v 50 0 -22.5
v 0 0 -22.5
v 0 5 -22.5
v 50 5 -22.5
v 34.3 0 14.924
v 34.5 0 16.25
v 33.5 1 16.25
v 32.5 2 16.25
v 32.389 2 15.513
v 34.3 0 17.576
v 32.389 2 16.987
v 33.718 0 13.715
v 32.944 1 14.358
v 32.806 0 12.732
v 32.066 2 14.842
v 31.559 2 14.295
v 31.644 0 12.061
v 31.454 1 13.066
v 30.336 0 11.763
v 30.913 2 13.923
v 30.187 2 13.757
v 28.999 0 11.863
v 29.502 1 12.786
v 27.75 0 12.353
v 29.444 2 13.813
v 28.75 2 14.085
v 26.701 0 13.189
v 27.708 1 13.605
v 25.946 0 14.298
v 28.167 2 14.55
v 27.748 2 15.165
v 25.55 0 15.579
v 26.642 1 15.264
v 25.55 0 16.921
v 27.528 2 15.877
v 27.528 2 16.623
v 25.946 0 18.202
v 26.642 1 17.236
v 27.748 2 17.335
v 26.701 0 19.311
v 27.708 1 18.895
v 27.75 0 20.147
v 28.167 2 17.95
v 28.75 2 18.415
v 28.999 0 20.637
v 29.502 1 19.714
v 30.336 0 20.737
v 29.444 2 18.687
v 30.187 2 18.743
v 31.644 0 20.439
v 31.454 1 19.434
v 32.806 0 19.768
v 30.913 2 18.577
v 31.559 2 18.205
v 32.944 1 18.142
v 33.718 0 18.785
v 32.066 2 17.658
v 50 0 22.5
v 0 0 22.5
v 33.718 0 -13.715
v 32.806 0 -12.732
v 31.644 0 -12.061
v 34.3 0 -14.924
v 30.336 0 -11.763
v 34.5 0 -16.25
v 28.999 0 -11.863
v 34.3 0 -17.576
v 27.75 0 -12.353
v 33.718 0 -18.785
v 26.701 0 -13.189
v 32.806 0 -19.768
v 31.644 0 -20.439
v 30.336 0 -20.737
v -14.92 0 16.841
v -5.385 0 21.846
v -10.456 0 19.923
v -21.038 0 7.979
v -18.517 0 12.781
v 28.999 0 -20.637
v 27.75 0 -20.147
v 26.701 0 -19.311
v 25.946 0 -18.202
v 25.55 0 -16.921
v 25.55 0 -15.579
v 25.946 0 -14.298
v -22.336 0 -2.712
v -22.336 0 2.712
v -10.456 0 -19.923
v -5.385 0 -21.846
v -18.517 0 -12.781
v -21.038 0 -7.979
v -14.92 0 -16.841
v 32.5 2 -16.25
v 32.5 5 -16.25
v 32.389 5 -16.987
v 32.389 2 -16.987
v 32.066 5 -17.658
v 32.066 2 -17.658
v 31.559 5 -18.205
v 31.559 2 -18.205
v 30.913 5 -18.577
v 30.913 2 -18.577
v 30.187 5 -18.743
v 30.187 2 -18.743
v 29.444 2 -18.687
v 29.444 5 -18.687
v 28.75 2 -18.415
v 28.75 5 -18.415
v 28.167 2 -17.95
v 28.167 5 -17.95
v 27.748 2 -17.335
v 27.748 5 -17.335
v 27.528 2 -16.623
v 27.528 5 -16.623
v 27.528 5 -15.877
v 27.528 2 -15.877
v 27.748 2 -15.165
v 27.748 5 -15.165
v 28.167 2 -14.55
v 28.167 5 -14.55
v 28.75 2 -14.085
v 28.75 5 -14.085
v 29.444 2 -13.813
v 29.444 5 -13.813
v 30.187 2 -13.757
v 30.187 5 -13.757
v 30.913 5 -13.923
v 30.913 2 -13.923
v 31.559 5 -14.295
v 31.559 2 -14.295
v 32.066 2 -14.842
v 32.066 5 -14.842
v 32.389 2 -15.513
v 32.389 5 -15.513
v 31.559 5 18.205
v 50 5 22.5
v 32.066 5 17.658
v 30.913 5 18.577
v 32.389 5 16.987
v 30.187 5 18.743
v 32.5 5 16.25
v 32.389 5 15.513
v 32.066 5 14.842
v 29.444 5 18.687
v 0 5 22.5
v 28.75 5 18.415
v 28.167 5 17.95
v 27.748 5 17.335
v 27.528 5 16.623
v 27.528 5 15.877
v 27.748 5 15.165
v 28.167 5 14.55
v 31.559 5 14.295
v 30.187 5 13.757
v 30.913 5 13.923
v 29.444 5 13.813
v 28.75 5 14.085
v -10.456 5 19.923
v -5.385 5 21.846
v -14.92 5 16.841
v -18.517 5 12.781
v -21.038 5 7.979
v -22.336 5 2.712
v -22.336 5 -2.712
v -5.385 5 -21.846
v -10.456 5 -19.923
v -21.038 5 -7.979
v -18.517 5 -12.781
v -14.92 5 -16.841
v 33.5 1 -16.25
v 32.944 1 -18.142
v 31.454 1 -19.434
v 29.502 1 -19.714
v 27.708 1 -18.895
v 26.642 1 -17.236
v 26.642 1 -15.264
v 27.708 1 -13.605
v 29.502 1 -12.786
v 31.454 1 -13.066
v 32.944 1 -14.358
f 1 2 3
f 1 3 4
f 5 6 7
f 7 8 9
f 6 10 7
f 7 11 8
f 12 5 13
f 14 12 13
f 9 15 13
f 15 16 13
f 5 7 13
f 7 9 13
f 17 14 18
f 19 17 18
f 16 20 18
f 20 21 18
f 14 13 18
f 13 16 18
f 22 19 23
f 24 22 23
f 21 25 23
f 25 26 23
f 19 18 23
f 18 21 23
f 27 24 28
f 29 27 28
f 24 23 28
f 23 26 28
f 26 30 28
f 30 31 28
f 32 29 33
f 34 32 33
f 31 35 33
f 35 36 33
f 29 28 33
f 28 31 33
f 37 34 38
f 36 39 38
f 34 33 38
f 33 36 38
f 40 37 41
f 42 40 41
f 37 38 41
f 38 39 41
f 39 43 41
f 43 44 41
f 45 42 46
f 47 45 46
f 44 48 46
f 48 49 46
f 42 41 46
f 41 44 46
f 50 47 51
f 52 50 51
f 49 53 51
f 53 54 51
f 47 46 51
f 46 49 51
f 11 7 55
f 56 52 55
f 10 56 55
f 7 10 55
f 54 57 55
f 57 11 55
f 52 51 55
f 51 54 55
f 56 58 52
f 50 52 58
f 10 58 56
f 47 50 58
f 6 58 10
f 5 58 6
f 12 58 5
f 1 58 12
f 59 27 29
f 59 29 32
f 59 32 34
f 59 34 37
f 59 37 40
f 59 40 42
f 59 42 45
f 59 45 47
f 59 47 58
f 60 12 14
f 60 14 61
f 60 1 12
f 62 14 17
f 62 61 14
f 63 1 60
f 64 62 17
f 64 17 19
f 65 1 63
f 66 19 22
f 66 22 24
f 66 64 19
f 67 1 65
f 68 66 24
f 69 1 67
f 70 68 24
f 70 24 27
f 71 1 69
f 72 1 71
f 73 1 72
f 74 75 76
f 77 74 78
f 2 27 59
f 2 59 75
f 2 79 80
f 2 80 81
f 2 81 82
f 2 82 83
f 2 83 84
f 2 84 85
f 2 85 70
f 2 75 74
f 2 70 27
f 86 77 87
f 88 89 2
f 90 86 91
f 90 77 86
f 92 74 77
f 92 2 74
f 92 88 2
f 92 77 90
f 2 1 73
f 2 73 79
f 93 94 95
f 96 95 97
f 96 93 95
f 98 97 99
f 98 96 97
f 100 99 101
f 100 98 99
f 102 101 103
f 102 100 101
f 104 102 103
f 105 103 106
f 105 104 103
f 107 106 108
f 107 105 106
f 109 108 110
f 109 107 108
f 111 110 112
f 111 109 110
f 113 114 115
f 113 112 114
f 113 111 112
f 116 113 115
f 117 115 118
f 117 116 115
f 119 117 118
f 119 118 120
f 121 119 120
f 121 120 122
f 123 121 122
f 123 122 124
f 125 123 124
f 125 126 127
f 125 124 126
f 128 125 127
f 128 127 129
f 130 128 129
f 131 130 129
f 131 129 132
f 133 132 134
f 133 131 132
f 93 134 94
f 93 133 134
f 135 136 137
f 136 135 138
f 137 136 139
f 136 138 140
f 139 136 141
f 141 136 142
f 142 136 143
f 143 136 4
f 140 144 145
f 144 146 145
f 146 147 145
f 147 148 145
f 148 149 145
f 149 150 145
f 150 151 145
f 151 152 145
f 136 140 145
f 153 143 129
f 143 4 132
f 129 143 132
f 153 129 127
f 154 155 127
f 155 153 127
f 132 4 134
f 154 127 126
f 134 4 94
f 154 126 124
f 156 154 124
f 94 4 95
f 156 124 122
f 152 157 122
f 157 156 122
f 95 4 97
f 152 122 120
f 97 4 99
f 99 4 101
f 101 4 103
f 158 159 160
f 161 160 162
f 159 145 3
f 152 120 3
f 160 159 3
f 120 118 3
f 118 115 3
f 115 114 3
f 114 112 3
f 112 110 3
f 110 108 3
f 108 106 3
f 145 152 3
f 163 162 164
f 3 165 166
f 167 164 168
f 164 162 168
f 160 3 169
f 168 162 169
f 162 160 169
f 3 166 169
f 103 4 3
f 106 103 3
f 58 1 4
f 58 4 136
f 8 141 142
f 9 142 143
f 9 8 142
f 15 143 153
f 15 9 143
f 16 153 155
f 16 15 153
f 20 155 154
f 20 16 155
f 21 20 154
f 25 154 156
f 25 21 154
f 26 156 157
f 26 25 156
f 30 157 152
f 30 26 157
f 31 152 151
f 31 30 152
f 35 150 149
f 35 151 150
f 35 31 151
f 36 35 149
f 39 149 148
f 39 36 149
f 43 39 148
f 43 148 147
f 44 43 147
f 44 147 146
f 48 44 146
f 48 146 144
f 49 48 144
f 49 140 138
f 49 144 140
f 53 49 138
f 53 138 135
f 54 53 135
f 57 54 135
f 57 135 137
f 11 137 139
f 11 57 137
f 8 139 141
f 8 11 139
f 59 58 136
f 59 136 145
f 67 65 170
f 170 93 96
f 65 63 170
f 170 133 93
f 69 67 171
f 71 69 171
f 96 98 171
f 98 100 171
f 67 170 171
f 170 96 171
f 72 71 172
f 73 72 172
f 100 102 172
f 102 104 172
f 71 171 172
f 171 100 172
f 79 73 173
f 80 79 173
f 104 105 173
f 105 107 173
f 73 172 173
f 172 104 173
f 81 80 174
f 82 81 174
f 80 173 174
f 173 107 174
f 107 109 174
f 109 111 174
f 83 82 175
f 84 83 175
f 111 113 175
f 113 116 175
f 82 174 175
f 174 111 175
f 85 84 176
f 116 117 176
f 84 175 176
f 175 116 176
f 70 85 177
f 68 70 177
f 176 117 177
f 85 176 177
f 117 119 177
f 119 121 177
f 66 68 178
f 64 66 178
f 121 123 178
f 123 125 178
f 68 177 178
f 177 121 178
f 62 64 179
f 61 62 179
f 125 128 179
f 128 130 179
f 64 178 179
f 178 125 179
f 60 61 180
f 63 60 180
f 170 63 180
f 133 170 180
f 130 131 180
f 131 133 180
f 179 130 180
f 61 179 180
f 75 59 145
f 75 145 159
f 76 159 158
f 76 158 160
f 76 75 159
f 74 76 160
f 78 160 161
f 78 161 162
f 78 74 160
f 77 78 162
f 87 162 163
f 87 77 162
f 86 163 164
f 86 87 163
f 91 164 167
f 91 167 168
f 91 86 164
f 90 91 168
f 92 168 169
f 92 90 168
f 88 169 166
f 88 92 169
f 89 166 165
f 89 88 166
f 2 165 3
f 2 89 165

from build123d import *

# Parameters (mm, degrees)
BOSS_EXTRUDE1_DEPTH     = 5
SKETCH2_R               = 2.5
CUT_EXTRUDE1_DEPTH      = 6
CUT_EXTRUDE1_DEPTH_BACK = 1
CHAMFER1_SIZE           = 2


with BuildPart() as part:
    # Sketch1 → Boss-Extrude1 (new body)
    with BuildSketch(Plane(origin=(0, 0, 0), x_dir=(1, 0, 0), z_dir=(0, 1, 0))):
        with BuildLine():
            Line((0, 22.5), (50, 22.5))
            Line((50, 22.5), (50, -22.5))
            Line((50, -22.5), (0, -22.5))
            ThreePointArc((0, -22.5), (-22.5, 0), (0, 22.5))
        make_face()
    extrude(amount=BOSS_EXTRUDE1_DEPTH)

    # Sketch2 → Cut-Extrude1 (cut, two sides)
    with BuildSketch(Plane(origin=(0, 0, 0), x_dir=(1, 0, 0), z_dir=(0, 1, 0))) as cut_extrude1_sk:
        with Locations((30, 16.25)):
            Circle(SKETCH2_R)
        with Locations((30, -16.25)):
            Circle(SKETCH2_R)
    extrude(amount=CUT_EXTRUDE1_DEPTH, mode=Mode.SUBTRACT)
    extrude(cut_extrude1_sk.sketch, amount=-CUT_EXTRUDE1_DEPTH_BACK, mode=Mode.SUBTRACT)

    # Chamfer1
    chamfer1_edges = [part.edges().sort_by_distance(p)[0] for p in [
        (27.5, 0, -16.25),
        (27.5, 0, 16.25),
    ]]
    chamfer(chamfer1_edges, length=CHAMFER1_SIZE)


solid = part.part
